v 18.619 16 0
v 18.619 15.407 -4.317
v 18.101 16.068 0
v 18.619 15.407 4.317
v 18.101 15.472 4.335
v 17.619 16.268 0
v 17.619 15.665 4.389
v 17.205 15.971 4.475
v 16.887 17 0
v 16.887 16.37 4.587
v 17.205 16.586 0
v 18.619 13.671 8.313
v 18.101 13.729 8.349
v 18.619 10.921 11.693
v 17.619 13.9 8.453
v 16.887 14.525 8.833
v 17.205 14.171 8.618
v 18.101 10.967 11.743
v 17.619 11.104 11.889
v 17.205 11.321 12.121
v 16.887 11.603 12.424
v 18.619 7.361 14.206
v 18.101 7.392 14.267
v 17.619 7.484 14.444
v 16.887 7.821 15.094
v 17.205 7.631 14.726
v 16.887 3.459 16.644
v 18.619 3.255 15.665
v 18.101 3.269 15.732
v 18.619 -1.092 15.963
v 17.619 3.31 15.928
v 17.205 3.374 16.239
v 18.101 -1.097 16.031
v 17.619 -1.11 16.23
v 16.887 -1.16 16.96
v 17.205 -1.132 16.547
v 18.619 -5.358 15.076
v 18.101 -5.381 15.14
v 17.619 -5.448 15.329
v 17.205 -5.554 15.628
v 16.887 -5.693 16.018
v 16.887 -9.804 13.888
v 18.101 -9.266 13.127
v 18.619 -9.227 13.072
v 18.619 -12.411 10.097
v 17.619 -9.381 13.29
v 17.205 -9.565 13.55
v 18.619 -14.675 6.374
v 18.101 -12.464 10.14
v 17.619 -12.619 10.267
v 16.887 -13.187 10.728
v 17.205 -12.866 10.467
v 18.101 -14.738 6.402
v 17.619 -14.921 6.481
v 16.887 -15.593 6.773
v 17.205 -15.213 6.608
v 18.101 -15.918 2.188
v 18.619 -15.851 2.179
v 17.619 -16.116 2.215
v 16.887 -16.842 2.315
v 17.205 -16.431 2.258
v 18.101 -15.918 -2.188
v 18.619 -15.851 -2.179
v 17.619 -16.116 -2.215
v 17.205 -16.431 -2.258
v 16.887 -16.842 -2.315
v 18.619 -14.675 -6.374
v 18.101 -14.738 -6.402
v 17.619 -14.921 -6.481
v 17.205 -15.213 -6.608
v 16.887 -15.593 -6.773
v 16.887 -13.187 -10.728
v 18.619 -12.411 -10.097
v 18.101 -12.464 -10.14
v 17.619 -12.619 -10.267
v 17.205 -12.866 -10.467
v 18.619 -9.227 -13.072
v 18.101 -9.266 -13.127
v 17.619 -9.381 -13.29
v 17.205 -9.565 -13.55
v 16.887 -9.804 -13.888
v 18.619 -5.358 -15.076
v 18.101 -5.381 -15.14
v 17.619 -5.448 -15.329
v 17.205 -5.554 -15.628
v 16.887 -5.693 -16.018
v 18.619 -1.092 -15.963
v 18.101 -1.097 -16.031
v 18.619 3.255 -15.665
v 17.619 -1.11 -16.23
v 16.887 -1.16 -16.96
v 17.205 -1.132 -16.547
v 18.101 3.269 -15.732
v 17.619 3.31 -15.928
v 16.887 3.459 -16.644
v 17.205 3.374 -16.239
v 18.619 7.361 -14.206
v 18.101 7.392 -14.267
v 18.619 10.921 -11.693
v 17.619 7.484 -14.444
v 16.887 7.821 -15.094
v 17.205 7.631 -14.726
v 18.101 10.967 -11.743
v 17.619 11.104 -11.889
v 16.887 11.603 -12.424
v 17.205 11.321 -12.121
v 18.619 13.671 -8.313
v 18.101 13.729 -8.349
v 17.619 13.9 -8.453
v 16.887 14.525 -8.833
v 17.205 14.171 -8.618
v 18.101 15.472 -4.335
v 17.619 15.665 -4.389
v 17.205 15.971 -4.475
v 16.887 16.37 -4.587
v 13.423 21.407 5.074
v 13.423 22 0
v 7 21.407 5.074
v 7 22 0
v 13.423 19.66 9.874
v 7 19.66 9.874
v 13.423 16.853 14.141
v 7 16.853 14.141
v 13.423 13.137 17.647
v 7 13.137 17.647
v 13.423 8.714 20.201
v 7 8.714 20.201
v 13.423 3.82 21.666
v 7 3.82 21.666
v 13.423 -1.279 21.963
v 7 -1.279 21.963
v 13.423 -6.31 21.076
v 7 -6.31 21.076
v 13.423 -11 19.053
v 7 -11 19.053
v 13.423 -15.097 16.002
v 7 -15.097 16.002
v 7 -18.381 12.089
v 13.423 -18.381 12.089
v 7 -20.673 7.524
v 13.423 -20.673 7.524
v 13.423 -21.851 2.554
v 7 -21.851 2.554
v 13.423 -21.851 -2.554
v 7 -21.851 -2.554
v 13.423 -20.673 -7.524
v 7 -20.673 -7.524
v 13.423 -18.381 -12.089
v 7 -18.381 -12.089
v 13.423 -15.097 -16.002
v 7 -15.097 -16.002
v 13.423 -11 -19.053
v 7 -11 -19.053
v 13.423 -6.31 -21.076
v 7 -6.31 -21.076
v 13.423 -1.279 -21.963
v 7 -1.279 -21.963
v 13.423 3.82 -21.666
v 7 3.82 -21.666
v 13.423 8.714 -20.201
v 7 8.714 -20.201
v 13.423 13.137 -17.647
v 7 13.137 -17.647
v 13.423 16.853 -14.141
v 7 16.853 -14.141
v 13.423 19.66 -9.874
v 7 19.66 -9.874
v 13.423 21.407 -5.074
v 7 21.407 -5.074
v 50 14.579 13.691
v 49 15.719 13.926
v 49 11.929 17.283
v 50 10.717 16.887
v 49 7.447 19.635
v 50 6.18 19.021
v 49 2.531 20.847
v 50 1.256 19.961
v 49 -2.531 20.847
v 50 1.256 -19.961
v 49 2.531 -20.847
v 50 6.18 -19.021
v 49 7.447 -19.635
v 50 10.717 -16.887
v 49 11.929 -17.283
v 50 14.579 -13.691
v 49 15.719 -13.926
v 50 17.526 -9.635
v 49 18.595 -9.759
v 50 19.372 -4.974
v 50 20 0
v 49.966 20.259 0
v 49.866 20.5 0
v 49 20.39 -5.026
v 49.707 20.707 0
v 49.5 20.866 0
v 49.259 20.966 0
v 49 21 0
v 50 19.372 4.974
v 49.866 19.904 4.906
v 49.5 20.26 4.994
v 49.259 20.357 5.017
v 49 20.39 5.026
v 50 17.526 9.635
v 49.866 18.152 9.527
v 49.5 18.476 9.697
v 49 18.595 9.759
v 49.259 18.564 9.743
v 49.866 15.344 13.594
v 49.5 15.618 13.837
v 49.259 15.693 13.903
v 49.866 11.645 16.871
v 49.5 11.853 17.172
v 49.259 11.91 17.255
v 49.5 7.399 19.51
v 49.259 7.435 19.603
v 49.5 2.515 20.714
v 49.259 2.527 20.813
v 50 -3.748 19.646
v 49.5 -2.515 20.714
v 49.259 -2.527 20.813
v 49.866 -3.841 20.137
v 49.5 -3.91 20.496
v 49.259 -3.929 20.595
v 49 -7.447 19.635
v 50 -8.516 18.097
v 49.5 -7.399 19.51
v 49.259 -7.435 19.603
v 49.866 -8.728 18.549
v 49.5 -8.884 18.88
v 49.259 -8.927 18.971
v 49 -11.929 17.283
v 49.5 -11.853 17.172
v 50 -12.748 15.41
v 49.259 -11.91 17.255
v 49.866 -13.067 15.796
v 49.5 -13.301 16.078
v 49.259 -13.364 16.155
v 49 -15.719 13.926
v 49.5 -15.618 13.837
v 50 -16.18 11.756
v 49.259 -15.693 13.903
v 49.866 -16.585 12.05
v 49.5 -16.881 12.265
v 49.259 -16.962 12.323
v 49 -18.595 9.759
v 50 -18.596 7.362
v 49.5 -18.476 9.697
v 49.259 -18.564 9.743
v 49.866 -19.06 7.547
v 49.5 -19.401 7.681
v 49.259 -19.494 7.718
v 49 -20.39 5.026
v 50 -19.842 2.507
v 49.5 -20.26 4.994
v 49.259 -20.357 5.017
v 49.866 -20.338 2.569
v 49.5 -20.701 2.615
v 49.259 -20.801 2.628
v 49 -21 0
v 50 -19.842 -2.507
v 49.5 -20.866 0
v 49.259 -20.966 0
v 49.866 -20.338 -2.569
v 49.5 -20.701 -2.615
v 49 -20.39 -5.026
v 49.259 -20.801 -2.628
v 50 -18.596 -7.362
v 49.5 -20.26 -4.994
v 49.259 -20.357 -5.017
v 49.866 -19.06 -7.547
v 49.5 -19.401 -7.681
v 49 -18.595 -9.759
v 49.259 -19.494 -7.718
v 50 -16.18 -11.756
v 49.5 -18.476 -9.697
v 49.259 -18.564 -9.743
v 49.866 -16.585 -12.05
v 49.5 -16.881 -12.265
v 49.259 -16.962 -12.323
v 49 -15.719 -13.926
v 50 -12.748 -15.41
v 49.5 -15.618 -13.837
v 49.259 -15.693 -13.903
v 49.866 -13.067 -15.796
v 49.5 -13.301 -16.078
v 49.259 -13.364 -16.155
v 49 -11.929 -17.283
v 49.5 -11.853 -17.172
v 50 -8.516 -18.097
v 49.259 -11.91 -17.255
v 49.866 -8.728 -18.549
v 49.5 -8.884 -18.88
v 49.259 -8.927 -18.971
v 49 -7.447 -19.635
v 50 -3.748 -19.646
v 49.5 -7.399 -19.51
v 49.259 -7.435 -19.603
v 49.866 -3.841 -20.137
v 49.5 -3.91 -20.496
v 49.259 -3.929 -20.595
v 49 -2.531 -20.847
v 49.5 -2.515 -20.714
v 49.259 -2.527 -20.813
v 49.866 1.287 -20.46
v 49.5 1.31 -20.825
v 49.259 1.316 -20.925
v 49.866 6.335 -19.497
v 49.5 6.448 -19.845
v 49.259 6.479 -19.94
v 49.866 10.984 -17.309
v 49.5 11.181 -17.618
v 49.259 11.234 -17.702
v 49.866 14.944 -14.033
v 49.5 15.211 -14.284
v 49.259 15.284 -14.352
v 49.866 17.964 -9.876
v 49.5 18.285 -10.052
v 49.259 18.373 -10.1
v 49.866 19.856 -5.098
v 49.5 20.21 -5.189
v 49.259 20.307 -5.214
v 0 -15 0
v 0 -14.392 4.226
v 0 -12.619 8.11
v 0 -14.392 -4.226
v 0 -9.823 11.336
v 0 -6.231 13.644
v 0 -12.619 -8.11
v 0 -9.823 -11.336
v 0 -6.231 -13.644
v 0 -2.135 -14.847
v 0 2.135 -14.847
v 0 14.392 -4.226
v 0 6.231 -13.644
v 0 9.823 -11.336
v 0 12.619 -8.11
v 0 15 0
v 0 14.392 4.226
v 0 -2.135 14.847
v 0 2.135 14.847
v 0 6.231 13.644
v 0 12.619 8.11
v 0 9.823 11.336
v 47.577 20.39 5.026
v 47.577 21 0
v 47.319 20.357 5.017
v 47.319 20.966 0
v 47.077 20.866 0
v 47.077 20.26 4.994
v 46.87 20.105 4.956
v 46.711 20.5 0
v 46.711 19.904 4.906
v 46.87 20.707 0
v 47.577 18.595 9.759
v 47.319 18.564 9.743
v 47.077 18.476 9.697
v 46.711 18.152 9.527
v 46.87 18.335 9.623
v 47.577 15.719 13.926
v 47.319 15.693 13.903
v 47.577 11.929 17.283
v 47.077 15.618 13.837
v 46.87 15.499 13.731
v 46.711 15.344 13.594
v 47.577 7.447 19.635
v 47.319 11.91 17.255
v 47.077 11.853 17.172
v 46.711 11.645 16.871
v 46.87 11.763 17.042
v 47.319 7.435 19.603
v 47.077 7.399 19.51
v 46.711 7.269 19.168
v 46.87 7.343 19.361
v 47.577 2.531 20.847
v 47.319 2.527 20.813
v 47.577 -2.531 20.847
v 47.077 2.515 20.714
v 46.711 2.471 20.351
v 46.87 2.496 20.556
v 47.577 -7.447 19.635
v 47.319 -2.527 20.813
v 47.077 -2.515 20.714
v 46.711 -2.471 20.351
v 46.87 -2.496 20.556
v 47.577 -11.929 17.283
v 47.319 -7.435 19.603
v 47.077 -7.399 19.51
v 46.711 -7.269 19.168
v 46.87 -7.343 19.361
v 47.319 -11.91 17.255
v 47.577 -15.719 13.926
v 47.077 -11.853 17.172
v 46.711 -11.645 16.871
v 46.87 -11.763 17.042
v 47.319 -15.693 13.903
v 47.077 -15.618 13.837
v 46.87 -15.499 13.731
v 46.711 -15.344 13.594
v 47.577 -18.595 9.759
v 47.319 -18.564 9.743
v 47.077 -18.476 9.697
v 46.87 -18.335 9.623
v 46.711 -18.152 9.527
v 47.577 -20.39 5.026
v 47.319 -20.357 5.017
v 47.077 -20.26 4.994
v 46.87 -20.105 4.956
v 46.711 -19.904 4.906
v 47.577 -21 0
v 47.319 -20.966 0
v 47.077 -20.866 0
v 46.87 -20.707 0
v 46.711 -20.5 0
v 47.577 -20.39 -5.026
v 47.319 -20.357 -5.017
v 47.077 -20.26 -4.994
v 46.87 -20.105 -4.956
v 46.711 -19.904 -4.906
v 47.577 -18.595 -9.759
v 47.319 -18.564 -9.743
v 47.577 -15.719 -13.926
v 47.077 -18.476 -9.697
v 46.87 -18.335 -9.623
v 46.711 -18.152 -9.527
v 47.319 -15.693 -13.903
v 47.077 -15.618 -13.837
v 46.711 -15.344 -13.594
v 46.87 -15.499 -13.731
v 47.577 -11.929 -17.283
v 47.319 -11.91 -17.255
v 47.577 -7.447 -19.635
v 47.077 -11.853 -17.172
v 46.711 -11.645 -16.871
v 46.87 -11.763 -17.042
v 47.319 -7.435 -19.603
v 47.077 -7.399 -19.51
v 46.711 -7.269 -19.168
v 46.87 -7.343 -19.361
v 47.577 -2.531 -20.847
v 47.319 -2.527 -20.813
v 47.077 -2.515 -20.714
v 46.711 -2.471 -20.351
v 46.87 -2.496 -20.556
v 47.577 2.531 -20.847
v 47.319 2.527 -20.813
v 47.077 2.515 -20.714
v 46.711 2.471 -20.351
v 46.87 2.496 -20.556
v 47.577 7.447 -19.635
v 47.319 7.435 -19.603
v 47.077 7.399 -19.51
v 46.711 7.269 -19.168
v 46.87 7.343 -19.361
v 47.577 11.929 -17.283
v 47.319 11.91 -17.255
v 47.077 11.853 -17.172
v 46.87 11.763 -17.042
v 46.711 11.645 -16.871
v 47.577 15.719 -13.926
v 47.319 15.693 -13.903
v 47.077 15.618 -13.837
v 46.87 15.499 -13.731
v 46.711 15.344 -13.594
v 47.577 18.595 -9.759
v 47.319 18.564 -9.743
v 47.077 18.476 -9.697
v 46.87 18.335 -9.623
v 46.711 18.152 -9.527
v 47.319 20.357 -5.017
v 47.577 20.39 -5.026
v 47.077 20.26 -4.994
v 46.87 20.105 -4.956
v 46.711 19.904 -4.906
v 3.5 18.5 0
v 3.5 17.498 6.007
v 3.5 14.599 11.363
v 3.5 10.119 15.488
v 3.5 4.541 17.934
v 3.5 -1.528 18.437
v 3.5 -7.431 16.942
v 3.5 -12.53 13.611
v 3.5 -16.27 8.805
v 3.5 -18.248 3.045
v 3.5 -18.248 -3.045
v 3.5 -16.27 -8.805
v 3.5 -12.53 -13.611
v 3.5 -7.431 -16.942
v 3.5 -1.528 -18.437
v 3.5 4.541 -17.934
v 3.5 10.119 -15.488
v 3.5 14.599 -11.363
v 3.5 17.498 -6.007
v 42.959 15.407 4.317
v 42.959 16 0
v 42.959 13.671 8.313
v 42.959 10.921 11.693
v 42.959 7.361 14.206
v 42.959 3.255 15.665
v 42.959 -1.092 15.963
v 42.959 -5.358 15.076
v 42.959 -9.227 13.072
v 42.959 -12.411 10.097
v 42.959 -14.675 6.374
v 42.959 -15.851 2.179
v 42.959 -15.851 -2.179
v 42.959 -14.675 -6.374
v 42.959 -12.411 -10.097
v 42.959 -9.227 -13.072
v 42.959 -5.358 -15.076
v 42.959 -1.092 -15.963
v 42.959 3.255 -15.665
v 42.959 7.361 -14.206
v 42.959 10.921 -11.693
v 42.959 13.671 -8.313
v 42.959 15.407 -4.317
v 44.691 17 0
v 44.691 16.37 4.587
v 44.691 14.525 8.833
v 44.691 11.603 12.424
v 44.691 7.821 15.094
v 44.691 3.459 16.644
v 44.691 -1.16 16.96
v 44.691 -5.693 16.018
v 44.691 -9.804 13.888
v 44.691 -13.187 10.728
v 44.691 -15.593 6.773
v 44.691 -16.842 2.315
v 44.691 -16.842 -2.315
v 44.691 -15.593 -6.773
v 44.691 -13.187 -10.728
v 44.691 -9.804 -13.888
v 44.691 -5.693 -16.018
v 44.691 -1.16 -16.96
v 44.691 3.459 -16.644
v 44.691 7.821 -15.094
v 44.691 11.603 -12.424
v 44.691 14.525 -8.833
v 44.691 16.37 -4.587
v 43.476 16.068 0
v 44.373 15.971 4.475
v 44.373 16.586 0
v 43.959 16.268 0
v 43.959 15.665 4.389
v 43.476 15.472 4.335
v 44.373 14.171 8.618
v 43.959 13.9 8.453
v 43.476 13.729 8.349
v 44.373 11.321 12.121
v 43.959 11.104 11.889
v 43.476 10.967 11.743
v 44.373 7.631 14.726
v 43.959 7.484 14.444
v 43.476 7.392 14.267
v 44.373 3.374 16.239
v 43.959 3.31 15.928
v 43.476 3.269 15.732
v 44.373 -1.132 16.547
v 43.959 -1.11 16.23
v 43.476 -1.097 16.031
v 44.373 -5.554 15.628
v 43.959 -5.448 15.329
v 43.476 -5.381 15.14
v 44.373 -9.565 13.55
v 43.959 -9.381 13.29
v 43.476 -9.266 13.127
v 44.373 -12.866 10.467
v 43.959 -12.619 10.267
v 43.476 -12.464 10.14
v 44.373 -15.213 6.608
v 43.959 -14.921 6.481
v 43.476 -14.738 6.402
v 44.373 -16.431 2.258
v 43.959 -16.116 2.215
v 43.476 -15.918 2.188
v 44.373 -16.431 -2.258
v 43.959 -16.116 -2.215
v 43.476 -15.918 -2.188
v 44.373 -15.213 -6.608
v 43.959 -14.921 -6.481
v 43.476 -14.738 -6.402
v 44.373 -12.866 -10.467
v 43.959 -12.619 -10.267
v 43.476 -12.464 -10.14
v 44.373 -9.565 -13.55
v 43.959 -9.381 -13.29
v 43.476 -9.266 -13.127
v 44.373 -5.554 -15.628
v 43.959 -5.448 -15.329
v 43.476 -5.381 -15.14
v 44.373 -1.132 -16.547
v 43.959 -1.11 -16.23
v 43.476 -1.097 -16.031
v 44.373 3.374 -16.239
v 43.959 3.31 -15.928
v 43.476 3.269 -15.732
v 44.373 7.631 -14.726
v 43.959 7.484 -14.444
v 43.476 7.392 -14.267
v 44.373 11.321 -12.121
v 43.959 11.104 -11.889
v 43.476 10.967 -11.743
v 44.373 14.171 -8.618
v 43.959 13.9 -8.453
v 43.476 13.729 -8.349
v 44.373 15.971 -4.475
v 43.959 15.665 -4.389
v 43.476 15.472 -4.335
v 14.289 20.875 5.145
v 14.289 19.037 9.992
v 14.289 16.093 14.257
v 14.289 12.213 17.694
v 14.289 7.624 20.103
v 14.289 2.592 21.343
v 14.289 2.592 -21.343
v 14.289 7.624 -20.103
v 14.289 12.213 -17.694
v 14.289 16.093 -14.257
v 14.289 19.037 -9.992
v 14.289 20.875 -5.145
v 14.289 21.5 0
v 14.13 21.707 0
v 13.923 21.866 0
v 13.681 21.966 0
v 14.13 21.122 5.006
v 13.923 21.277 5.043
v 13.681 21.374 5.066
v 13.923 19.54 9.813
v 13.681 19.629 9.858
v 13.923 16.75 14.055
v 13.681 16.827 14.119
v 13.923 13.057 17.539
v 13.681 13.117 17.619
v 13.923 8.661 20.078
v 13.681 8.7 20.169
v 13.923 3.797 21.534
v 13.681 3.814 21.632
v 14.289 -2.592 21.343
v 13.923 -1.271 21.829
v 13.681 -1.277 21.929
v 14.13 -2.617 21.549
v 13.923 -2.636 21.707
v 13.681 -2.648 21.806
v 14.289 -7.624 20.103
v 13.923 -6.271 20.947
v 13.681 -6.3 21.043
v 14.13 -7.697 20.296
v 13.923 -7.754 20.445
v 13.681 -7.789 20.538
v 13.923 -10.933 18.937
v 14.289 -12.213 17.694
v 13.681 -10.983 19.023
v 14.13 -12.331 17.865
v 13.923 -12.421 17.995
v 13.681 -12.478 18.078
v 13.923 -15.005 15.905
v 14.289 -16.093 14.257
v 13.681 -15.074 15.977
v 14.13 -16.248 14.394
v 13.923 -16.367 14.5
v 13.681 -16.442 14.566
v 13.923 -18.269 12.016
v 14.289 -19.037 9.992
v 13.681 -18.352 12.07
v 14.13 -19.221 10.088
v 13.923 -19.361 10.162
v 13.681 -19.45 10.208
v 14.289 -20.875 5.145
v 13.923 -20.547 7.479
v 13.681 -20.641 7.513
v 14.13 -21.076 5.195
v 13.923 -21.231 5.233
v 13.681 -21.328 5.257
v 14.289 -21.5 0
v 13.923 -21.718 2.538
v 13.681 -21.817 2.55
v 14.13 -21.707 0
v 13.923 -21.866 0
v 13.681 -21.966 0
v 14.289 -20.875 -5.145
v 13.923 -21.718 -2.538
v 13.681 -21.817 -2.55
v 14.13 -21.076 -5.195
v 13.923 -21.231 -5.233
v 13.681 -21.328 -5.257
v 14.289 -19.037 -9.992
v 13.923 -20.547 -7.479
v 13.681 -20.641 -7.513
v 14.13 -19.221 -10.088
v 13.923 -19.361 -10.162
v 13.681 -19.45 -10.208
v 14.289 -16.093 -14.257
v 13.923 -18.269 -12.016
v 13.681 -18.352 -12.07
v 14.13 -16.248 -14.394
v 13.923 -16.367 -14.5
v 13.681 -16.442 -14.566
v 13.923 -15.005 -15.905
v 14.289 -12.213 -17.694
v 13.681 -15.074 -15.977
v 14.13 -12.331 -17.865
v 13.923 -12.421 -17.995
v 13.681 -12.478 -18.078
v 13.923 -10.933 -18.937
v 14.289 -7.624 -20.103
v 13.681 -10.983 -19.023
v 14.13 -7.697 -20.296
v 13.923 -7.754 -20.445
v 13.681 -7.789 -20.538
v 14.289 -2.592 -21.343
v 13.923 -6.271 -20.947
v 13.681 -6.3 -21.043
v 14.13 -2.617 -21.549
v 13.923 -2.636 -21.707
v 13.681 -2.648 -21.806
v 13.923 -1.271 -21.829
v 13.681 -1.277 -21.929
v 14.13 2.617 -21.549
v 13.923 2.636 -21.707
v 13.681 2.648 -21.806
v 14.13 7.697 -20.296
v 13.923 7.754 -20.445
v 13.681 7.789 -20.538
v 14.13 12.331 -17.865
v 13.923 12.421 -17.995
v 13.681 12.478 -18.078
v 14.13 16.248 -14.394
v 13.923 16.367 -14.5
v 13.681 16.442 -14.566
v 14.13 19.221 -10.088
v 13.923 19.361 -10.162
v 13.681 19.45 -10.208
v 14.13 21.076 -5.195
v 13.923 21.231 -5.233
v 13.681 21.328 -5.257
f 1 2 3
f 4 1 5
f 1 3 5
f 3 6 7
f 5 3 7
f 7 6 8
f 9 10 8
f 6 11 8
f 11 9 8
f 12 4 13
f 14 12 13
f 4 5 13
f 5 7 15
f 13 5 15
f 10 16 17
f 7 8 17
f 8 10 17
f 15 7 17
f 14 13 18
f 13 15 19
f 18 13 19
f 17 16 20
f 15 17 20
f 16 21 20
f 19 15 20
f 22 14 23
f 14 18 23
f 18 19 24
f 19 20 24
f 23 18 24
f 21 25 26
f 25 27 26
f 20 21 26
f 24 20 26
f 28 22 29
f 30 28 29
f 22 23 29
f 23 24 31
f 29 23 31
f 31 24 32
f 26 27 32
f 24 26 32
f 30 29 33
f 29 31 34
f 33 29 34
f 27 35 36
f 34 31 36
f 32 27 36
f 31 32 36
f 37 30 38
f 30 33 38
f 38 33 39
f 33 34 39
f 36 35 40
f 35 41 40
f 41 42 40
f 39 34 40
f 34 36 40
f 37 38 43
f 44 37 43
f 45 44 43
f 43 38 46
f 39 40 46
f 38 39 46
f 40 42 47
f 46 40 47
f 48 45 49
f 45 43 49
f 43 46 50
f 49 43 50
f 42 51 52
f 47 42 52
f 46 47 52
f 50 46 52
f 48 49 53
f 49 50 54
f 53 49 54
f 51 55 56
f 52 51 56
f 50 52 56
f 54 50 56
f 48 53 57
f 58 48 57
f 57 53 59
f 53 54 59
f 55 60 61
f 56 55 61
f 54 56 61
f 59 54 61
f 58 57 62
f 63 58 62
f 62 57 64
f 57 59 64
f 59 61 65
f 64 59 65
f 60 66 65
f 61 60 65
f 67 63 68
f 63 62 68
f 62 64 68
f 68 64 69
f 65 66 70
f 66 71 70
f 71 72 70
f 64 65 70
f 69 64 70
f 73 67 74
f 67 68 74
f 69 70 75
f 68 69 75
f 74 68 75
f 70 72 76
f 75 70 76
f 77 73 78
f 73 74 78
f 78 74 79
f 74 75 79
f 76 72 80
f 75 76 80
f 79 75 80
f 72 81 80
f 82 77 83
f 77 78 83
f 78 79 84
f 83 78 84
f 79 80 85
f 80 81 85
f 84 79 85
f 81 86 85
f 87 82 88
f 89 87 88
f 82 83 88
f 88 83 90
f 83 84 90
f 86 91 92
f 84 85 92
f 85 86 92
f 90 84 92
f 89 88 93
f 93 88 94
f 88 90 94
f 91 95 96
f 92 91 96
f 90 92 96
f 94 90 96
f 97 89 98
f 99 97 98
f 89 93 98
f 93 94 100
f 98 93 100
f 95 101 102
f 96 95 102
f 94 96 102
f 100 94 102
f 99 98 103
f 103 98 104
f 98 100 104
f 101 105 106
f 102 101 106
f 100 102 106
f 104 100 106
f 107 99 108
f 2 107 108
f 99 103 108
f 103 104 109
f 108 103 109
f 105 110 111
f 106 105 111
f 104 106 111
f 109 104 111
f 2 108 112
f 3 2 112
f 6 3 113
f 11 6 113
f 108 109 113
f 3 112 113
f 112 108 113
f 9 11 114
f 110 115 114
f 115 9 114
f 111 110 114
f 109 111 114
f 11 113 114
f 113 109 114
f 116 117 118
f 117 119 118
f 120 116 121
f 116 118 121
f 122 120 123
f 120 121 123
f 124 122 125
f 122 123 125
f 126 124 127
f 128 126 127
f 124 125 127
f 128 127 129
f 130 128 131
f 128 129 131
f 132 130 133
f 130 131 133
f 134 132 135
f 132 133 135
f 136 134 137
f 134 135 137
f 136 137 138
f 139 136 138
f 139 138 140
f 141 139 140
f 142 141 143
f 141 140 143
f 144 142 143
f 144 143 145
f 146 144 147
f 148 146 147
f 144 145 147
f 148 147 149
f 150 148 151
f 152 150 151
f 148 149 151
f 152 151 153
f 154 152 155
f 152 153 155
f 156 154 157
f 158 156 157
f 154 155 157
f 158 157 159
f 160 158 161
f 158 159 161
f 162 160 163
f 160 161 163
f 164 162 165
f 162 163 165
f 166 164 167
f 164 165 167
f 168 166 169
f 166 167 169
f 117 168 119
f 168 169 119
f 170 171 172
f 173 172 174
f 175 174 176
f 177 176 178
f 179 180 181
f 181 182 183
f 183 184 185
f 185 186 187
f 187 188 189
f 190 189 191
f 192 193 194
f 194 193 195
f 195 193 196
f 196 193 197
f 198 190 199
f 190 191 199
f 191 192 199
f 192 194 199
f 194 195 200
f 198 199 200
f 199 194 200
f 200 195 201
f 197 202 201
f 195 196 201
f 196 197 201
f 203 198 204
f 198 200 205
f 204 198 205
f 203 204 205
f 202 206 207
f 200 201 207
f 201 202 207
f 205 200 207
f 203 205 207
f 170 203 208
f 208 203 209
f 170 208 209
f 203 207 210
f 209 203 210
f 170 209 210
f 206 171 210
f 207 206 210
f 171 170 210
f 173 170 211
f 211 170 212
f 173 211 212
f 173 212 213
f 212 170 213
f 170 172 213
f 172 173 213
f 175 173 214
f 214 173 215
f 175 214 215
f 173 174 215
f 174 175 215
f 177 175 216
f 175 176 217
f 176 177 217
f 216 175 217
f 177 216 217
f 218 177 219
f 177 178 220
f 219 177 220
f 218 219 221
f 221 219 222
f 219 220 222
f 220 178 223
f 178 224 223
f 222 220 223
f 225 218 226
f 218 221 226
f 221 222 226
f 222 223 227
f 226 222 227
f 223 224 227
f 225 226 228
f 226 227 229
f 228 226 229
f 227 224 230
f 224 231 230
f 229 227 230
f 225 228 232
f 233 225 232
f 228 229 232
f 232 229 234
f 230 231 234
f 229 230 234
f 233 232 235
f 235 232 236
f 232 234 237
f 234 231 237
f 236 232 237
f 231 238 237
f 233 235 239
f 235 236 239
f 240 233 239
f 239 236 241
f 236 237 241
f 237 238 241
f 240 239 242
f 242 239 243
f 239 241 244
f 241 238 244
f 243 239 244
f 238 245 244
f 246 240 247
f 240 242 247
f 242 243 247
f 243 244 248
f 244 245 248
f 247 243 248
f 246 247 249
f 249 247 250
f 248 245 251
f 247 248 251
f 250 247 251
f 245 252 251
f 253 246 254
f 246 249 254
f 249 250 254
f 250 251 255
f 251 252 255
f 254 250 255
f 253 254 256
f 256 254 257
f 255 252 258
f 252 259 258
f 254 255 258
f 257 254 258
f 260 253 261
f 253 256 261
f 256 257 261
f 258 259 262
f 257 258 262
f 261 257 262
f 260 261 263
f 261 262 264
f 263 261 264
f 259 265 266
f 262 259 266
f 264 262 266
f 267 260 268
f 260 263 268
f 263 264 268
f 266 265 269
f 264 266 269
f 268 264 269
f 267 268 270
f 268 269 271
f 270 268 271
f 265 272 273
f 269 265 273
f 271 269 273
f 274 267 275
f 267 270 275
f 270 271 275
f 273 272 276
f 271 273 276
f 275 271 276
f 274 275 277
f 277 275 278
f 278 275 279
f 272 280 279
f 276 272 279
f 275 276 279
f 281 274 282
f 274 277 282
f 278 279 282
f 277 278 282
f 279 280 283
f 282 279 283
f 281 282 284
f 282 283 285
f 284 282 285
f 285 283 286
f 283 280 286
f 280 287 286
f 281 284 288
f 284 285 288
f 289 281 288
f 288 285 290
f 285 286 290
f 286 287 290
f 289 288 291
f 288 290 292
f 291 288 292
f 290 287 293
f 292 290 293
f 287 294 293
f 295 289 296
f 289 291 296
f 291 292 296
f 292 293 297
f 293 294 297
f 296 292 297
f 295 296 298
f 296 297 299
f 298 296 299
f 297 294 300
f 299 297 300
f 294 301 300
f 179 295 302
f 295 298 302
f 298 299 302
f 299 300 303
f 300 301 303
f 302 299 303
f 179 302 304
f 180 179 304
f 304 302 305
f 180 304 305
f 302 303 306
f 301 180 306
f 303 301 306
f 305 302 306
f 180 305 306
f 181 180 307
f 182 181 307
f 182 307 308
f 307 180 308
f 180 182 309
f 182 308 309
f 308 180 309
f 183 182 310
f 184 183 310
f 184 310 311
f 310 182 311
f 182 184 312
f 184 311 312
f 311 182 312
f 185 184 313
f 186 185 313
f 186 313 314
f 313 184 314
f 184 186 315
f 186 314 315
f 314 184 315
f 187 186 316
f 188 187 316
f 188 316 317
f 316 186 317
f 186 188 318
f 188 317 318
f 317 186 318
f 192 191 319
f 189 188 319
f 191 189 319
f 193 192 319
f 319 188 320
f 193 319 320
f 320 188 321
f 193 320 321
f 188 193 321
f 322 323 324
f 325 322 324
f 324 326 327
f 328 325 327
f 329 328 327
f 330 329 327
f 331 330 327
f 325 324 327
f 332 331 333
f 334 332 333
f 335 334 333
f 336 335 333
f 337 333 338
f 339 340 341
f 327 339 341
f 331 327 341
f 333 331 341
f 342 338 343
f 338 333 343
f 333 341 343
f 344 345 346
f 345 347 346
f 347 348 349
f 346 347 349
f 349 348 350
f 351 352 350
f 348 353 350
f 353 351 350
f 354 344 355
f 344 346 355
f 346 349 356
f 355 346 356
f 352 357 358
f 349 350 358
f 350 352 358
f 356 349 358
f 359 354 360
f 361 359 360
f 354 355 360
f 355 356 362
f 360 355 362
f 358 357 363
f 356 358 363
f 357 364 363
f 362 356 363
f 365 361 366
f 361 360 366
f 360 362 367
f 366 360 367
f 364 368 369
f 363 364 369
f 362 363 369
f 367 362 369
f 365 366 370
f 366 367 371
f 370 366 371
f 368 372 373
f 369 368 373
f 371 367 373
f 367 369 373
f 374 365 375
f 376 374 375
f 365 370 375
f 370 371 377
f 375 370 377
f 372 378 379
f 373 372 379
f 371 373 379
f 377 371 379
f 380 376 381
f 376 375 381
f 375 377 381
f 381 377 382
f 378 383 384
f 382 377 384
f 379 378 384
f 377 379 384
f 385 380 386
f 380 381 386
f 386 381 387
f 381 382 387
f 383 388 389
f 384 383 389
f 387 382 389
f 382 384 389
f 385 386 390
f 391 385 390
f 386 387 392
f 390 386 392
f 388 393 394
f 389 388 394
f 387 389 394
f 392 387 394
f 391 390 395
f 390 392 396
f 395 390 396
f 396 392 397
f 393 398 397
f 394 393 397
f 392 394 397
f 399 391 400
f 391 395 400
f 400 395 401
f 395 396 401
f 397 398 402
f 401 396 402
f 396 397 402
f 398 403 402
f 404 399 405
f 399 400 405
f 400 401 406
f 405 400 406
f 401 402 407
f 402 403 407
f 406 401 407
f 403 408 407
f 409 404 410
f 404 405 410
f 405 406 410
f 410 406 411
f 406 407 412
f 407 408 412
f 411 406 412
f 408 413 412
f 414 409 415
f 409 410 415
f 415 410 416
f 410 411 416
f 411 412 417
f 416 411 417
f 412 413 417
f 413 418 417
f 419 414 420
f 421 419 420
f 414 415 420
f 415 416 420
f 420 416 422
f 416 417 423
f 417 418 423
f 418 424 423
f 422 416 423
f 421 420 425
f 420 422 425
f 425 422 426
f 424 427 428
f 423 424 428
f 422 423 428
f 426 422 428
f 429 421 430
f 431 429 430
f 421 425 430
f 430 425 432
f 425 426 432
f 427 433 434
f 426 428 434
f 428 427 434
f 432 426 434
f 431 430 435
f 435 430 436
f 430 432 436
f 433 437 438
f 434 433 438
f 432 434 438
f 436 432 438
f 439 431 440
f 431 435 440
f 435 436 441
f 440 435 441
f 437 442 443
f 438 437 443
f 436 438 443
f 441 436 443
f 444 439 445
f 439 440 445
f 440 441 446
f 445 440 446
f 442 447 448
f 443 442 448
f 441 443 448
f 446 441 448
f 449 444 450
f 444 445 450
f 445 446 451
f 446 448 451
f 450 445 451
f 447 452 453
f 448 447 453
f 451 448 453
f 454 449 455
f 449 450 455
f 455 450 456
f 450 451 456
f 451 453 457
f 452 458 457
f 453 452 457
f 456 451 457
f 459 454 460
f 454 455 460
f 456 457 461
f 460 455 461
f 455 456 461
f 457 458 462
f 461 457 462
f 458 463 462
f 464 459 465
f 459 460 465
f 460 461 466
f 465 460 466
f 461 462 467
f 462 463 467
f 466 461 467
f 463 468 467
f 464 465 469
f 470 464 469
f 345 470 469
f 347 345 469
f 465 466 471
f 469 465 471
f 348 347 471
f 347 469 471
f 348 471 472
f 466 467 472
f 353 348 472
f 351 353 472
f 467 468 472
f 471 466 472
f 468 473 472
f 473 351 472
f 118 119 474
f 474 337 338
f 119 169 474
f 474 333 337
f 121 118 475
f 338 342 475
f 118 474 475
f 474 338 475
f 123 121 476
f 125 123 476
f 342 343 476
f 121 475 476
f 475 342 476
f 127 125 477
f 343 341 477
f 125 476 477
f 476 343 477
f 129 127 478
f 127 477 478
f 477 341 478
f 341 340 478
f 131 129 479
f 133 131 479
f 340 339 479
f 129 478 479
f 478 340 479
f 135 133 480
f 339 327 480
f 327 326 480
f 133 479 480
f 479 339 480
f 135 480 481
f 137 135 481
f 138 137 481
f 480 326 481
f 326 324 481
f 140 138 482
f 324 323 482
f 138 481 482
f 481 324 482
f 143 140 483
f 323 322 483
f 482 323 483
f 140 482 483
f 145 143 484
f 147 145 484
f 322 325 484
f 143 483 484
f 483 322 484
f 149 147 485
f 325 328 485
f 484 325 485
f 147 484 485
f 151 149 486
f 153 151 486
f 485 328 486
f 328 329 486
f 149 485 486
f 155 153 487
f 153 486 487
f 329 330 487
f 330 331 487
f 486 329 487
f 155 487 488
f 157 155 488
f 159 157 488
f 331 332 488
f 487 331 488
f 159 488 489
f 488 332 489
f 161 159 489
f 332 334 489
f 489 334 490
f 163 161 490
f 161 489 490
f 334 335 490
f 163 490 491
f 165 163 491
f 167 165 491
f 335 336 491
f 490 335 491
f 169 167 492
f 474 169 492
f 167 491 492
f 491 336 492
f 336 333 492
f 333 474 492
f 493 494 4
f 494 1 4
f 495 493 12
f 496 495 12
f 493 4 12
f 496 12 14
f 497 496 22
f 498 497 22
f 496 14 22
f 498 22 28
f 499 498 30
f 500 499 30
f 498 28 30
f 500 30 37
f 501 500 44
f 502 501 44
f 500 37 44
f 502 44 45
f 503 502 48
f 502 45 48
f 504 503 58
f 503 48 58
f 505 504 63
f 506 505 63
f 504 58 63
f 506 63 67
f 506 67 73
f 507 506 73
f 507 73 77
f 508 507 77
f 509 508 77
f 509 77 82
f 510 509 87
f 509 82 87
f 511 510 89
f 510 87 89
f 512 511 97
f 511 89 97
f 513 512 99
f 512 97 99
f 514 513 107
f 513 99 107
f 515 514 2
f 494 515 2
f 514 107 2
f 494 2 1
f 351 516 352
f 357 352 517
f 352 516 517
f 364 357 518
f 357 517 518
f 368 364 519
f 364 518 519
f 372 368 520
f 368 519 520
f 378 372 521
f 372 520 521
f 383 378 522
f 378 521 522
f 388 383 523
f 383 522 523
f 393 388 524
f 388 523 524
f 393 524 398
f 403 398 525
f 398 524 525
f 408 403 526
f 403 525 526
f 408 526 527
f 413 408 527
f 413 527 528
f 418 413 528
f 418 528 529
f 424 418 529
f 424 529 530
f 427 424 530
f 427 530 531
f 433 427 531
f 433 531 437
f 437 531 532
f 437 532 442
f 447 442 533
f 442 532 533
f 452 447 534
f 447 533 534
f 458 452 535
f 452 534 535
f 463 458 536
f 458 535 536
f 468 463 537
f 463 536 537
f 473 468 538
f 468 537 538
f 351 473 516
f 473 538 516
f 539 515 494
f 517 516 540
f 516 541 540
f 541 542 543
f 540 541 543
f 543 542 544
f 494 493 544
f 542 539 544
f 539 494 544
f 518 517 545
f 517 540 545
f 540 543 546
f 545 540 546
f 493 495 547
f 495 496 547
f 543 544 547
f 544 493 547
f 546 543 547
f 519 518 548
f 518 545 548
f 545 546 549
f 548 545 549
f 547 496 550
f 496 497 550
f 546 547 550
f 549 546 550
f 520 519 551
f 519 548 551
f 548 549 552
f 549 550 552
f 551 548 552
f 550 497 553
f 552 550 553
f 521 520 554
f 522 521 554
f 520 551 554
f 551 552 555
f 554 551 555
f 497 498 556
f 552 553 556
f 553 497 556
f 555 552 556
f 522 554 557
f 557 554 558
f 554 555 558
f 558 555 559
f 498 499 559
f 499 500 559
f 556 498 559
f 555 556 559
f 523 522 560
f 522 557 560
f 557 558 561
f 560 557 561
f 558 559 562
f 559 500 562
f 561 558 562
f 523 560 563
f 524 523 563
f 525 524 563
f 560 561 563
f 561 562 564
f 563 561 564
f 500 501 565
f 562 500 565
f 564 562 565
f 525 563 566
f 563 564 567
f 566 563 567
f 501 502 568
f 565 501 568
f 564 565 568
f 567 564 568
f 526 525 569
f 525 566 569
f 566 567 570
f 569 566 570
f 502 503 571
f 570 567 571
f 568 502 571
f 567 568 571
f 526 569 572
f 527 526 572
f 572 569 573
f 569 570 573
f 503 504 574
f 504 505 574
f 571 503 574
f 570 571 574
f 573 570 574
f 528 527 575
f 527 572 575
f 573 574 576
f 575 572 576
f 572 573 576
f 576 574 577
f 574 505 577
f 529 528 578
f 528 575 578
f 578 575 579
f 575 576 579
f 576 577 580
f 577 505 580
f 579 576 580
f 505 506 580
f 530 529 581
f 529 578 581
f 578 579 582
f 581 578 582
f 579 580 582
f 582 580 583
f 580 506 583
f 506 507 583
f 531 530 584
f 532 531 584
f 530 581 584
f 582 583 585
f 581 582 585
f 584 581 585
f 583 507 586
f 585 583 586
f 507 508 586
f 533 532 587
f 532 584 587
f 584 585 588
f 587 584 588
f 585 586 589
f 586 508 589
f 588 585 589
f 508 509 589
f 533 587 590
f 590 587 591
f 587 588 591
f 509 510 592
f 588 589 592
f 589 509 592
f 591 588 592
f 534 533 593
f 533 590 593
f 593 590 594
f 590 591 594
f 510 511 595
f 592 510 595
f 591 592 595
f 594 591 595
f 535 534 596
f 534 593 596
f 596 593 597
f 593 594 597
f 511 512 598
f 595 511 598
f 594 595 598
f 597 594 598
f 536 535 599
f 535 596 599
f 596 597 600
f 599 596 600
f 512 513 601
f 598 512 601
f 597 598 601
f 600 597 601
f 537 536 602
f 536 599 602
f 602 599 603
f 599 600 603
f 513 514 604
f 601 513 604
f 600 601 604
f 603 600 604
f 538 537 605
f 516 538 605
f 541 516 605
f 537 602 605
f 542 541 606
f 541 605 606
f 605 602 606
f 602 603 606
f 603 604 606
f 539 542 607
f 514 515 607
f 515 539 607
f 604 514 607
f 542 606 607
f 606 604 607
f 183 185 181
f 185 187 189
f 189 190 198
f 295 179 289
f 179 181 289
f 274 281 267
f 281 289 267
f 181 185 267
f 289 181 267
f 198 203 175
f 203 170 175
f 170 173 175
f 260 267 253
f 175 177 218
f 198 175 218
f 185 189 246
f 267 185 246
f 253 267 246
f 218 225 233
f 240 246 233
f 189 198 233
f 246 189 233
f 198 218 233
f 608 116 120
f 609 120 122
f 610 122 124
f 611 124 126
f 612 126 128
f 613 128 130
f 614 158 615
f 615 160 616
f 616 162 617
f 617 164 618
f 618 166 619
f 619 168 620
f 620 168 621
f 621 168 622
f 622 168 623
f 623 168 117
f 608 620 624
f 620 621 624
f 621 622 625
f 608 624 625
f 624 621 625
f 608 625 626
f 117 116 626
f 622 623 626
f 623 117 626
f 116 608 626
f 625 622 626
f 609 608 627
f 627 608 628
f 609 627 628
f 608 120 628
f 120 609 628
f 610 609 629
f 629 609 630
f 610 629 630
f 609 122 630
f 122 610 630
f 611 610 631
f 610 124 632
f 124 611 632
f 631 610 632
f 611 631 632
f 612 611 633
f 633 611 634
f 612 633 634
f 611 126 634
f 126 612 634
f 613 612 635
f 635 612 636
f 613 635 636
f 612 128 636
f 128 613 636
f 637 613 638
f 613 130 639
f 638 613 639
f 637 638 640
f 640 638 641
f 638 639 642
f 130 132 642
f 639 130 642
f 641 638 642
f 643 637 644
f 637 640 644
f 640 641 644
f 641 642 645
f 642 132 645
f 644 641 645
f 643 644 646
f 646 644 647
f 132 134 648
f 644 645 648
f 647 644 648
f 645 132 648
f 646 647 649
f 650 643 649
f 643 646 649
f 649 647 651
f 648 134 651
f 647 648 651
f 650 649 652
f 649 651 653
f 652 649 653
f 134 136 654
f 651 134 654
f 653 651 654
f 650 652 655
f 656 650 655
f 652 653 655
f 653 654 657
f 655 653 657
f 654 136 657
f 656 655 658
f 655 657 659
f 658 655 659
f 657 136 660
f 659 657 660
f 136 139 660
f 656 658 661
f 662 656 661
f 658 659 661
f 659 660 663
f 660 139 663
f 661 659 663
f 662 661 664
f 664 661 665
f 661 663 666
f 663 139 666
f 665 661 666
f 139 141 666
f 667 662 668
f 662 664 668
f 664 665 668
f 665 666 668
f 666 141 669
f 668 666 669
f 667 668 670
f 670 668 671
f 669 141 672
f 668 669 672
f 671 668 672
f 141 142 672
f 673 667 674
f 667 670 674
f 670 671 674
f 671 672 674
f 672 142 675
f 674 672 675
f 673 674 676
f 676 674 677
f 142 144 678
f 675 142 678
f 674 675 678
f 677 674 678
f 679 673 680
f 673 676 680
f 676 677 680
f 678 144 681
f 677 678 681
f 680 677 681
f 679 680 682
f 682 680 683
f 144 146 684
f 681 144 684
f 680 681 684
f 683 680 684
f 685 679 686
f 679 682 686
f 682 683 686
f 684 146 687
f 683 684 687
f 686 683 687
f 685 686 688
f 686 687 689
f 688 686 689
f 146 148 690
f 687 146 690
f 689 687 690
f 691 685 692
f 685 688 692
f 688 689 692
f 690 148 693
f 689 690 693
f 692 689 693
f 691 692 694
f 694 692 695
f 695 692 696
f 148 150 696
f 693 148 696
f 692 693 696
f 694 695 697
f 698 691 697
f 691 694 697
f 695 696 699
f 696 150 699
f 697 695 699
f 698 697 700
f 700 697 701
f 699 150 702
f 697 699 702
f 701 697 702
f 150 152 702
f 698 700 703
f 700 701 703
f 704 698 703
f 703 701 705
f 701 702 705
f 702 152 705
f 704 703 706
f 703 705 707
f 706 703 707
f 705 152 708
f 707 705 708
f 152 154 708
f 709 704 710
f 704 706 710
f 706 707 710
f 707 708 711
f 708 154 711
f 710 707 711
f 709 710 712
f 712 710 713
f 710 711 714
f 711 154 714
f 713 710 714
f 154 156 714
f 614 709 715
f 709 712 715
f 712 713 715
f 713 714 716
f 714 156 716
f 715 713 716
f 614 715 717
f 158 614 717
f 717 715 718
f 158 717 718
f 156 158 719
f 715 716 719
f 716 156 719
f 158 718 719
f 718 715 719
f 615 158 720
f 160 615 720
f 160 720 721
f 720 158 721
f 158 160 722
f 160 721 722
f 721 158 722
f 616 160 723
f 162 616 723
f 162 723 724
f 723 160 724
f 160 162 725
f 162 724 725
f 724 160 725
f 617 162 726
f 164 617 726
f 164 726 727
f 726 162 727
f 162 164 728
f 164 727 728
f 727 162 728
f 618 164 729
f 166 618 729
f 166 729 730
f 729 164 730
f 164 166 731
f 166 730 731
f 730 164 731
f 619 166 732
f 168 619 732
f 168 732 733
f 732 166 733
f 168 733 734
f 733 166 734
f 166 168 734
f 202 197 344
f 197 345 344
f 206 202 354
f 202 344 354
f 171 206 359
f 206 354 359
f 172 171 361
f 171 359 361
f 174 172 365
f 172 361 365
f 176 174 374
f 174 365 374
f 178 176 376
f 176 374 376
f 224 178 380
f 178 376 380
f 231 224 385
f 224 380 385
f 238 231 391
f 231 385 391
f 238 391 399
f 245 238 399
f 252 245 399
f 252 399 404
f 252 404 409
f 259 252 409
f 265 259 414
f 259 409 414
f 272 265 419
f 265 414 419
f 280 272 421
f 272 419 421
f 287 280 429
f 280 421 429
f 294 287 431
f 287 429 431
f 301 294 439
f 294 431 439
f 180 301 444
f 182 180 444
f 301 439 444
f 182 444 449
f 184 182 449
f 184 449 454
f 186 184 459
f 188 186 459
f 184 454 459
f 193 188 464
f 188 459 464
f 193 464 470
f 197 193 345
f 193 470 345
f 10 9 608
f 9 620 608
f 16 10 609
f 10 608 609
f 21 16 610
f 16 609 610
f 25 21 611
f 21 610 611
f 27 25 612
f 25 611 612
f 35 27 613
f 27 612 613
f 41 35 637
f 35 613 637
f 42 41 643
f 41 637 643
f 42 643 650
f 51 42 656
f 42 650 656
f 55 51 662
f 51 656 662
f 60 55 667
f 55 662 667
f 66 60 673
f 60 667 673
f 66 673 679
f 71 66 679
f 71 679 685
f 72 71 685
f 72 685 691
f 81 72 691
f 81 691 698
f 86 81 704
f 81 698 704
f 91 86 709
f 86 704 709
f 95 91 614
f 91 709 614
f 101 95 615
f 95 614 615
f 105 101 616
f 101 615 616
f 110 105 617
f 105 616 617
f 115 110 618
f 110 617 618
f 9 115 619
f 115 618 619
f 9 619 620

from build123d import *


with BuildPart() as part:
    # Sketch1 → Revolve1 (revolve)
    with BuildSketch(Plane.XY):
        with BuildLine():
            Line((50, 0), (50, 20))
            ThreePointArc((50, 20), (49.707106781, 20.707106781), (49, 21))
            Line((49, 21), (47.577350269, 21))
            ThreePointArc((47.577350269, 21), (47.077350269, 20.866025404), (46.711324865, 20.5))
            Line((46.711324865, 20.5), (44.690598923, 17))
            ThreePointArc((44.690598923, 17), (43.958548116, 16.267949192), (42.958548116, 16))
            Line((42.958548116, 16), (18.618802154, 16))
            ThreePointArc((18.618802154, 16), (17.618802154, 16.267949192), (16.886751346, 17))
            Line((16.886751346, 17), (14.288675135, 21.5))
            ThreePointArc((14.288675135, 21.5), (13.922649731, 21.866025404), (13.422649731, 22))
            Line((13.422649731, 22), (7, 22))
            Line((7, 22), (0, 15))
            Line((0, 15), (0, 0))
            Line((0, 0), (50, 0))
        make_face()
    revolve(axis=Axis((0, 0, 0), (1, 0, 0)))


solid = part.part
